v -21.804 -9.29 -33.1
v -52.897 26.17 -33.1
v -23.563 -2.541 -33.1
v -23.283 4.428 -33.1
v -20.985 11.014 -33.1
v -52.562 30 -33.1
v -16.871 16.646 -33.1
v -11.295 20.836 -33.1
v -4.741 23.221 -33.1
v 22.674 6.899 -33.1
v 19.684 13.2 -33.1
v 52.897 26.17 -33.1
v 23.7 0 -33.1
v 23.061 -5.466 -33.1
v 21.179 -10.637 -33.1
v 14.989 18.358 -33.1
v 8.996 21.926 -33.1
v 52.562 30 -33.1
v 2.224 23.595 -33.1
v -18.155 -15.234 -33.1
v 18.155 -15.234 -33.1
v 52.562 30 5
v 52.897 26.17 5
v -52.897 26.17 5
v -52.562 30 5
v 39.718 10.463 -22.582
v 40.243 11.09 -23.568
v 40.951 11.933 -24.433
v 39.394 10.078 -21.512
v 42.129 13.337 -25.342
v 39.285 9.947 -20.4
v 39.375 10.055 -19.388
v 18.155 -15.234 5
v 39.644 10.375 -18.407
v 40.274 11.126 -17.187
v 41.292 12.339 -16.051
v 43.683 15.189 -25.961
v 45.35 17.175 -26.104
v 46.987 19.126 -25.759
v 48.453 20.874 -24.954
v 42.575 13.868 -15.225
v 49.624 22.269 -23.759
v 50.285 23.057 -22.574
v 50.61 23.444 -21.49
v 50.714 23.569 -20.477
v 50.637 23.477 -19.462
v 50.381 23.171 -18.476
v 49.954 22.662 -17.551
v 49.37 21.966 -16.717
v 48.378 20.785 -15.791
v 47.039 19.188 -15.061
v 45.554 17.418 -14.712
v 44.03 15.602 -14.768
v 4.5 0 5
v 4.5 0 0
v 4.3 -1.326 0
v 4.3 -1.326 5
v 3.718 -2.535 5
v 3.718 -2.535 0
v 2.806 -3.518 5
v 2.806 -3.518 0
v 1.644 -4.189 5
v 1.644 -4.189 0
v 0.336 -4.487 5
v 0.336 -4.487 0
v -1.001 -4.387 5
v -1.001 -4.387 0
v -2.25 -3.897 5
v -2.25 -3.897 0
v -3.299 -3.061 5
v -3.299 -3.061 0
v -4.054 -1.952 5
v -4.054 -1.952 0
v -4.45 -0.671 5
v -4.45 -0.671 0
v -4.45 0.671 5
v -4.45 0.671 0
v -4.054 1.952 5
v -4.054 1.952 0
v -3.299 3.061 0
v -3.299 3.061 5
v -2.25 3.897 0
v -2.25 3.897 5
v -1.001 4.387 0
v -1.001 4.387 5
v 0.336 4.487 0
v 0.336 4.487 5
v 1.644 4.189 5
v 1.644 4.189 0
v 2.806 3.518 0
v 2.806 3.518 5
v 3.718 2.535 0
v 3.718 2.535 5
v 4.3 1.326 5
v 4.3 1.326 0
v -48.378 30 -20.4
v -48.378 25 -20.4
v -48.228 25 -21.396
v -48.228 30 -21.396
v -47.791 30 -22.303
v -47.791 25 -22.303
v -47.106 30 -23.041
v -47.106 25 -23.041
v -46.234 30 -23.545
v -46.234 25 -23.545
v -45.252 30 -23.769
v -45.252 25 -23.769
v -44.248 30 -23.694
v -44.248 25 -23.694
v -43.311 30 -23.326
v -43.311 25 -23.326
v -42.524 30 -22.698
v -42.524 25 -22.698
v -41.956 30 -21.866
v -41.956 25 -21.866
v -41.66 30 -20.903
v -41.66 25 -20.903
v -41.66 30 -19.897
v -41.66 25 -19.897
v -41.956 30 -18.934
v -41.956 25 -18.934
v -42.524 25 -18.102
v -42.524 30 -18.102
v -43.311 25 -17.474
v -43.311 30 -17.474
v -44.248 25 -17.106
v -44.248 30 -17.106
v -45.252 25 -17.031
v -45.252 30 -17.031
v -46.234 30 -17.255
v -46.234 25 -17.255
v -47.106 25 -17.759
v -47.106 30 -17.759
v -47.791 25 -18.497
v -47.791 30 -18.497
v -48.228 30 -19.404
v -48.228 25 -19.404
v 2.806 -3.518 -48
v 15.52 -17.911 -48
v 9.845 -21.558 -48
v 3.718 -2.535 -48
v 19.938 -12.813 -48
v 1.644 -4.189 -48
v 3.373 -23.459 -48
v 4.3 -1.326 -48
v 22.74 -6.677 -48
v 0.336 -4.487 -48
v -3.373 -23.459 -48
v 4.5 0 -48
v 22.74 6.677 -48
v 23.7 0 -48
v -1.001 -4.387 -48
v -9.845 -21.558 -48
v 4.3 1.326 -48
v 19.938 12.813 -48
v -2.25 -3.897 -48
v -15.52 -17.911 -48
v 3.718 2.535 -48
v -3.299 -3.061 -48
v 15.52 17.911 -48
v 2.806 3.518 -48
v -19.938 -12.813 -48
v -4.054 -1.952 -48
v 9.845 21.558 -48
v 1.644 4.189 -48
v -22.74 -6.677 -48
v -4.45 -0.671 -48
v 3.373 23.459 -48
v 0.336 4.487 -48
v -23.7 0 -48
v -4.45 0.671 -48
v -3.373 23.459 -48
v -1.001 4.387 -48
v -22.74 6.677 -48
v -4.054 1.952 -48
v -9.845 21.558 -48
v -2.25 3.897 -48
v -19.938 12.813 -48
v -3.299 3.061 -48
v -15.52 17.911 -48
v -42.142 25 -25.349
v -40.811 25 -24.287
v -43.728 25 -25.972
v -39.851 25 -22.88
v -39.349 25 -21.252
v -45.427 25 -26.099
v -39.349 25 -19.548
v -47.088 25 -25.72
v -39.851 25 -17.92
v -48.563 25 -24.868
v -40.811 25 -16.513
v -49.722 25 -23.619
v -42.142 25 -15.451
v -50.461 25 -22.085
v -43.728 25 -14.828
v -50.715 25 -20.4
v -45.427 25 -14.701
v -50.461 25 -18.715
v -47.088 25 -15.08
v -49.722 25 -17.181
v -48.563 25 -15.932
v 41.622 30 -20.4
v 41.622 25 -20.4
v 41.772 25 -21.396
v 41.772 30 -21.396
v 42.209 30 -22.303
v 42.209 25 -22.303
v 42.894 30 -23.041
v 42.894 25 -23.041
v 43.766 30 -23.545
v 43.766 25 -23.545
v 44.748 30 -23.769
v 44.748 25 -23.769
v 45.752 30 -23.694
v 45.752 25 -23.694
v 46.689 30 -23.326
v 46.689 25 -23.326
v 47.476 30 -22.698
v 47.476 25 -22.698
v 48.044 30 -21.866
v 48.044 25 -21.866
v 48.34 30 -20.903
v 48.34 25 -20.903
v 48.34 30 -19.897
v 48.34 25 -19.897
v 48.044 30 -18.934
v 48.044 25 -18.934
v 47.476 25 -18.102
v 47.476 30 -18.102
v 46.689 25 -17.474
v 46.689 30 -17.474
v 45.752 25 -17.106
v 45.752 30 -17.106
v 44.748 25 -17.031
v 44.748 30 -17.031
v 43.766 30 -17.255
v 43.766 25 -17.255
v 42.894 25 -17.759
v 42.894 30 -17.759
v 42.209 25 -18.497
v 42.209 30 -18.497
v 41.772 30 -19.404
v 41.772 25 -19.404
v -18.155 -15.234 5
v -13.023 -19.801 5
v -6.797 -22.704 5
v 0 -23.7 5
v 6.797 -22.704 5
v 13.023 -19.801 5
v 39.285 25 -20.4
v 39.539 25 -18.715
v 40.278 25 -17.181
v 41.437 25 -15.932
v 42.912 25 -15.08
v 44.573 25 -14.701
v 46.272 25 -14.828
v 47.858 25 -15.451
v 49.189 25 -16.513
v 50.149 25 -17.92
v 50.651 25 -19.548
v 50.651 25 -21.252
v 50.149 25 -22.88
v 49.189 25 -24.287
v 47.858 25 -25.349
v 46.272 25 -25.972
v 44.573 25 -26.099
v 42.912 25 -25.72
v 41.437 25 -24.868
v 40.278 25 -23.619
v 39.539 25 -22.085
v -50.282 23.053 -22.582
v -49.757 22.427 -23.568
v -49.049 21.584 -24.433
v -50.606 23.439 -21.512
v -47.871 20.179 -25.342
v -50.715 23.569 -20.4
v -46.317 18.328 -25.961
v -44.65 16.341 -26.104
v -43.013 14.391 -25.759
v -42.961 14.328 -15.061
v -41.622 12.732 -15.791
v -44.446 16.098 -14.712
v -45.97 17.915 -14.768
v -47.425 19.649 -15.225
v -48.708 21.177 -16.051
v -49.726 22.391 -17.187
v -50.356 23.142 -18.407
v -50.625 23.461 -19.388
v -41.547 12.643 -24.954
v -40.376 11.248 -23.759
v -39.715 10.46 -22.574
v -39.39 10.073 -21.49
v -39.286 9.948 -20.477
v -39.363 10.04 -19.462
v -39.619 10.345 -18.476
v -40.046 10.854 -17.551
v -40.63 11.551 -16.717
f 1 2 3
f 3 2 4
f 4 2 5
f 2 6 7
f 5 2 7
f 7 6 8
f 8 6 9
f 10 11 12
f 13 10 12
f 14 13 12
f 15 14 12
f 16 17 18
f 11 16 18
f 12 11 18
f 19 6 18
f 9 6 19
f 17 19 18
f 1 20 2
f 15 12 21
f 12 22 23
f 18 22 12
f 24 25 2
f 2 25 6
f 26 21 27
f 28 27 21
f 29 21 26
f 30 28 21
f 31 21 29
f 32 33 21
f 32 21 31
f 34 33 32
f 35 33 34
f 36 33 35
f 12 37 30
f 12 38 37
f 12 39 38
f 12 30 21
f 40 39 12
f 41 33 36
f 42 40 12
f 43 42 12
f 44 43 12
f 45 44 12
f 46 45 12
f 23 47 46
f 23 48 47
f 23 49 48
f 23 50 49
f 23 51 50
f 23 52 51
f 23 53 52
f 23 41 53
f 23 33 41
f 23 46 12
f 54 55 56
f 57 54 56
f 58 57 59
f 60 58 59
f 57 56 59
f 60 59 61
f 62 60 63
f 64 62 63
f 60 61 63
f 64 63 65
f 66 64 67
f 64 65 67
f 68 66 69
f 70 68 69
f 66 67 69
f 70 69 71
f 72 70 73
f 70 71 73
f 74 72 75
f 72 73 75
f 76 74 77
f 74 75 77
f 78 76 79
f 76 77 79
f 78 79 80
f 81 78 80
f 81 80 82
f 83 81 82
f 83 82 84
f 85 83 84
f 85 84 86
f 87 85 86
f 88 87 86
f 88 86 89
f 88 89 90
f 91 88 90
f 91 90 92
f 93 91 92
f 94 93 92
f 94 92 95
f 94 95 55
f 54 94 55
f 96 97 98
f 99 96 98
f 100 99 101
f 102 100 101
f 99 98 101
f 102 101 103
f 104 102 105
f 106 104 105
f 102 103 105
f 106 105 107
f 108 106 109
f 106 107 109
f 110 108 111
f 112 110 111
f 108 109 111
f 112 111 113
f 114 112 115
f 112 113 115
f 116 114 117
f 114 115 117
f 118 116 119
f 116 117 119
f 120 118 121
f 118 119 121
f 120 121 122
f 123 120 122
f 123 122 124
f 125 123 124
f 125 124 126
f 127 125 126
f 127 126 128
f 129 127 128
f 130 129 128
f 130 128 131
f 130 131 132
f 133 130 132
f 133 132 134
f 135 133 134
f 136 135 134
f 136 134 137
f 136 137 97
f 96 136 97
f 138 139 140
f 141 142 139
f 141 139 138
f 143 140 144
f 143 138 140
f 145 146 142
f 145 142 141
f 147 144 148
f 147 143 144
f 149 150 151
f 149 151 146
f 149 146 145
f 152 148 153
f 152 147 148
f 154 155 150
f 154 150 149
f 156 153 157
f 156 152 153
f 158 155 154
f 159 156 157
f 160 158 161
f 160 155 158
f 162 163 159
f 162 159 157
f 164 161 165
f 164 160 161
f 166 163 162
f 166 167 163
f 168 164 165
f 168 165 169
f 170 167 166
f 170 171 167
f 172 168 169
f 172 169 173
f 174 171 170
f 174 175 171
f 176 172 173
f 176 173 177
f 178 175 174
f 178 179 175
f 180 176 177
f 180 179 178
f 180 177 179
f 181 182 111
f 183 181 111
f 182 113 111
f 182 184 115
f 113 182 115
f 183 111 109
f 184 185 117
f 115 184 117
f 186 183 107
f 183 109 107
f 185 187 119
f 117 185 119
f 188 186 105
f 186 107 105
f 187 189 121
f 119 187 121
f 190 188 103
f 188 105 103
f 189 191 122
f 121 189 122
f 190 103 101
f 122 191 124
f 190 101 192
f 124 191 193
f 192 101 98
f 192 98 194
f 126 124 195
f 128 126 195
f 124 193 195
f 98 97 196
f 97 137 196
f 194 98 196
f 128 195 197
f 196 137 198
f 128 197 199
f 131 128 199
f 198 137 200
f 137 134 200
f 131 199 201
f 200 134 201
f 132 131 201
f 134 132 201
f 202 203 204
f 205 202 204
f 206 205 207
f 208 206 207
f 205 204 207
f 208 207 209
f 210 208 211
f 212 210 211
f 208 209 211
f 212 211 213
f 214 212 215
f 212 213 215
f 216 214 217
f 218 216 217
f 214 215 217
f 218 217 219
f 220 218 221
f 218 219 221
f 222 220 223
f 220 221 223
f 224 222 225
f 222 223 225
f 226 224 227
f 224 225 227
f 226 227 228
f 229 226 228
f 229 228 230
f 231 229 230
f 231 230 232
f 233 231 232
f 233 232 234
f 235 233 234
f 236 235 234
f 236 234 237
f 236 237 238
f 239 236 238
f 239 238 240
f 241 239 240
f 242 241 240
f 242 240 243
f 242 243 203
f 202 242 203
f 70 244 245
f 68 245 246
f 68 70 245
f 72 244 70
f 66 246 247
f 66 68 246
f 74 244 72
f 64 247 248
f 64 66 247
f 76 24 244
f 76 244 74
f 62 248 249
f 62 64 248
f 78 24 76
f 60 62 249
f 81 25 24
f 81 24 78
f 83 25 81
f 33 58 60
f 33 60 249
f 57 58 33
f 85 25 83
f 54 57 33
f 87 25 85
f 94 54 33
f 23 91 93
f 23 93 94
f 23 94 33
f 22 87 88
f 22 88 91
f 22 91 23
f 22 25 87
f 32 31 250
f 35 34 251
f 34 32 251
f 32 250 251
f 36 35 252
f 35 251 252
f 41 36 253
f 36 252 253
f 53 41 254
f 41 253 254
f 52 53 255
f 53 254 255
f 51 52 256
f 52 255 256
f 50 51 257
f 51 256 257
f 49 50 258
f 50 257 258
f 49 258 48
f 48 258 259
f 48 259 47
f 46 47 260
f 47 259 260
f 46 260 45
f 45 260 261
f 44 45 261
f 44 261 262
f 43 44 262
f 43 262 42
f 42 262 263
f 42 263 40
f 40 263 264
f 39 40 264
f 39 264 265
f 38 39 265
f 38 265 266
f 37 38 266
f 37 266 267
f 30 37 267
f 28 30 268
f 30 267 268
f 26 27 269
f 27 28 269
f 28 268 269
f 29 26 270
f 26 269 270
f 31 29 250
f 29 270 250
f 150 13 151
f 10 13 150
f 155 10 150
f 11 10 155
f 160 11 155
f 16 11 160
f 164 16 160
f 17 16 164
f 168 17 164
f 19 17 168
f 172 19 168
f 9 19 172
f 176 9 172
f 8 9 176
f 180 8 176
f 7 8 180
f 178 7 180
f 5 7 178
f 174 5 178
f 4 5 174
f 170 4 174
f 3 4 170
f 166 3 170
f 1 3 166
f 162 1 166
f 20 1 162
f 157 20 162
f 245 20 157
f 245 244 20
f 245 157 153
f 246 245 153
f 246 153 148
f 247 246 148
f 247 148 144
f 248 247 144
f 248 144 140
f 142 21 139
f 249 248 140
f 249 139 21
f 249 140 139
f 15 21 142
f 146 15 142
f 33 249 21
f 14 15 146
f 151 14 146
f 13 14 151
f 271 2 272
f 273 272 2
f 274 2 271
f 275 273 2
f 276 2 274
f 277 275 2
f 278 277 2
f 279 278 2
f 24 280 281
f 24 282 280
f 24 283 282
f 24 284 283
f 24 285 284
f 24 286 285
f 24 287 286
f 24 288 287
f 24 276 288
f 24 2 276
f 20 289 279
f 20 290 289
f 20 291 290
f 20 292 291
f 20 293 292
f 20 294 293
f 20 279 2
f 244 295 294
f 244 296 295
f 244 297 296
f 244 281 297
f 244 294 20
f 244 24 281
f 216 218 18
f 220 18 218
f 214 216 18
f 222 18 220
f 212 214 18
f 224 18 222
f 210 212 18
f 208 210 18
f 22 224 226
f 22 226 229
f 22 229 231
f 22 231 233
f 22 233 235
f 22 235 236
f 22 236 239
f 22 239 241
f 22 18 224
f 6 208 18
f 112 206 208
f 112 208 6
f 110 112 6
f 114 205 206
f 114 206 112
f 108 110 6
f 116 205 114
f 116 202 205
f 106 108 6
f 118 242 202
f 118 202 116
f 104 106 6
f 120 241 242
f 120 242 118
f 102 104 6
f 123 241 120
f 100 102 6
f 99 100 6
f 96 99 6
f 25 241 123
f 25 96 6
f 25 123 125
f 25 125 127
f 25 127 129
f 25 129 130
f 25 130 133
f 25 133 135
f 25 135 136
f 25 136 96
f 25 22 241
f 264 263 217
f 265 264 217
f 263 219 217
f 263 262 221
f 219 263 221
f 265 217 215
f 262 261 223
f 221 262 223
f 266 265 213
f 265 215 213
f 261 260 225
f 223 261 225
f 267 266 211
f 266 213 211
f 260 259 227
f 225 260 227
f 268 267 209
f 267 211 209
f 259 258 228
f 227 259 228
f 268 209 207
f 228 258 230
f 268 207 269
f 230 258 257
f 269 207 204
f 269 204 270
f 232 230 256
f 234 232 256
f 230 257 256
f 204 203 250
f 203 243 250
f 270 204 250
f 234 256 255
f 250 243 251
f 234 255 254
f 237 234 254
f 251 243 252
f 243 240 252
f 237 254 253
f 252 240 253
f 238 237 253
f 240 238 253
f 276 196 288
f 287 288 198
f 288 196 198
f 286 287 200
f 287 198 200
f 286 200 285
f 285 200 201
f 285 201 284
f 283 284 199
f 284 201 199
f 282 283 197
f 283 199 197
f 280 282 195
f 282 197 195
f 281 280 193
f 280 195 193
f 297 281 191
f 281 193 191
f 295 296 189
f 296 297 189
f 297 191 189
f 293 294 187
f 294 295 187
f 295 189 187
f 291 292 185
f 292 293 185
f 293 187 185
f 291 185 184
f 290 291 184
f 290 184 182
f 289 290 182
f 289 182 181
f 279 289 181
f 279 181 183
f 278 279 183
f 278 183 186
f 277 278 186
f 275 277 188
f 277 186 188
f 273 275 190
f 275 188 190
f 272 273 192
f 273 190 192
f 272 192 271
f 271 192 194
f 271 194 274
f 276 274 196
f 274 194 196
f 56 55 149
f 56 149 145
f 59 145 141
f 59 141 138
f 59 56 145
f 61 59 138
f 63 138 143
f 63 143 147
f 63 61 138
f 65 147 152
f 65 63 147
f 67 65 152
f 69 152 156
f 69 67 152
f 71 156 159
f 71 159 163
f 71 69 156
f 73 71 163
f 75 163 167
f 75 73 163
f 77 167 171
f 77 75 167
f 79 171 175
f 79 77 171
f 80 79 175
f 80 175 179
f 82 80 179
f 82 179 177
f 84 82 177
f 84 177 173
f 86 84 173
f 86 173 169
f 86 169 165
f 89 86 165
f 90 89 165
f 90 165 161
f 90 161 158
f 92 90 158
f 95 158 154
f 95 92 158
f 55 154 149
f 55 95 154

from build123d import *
from OCP.BRepFilletAPI import BRepFilletAPI_MakeChamfer

# Parameters (mm, degrees)
SKETCH1_R               = 23.7
SKETCH1_R_2             = 18.7
BOSS_EXTRUDE1_DEPTH     = 48
BOSS_EXTRUDE2_START     = 5
SKETCH1_3_R             = 23.7
SKETCH1_3_R_2           = 18.7
SKETCH1_3_R_3           = 15.5
SKETCH1_3_R_4           = 6.5
BOSS_EXTRUDE2_DEPTH     = 5
BOSS_EXTRUDE3_DEPTH     = 38.1
F_1_4_CLEARANCE_HOLE1_D = 6.7564
SKETCH9_R               = 5.715
CUT_EXTRUDE1_DEPTH      = 89.454226705
CHAMFER1_SIZE           = 5
CHAMFER1_SIZE2          = 3.549039071
SKETCH10_R              = 18.7
SKETCH10_R_2            = 4.5
BOSS_EXTRUDE4_DEPTH     = 48
SKETCH10_2_R            = 4.5
CUT_EXTRUDE2_DEPTH      = 78.473312523


with BuildPart() as part:
    # Sketch1 → Boss-Extrude1 (new body)
    with BuildSketch(Plane.XY):
        Circle(SKETCH1_R)
        Circle(SKETCH1_R_2, mode=Mode.SUBTRACT)
    extrude(amount=-BOSS_EXTRUDE1_DEPTH)

    # Sketch1<3> → Boss-Extrude2 (add)
    # profile 1 of 4: a face of its own
    with BuildSketch(Plane.XY.offset(BOSS_EXTRUDE2_START)):
        Circle(SKETCH1_3_R)
        Circle(SKETCH1_3_R_2, mode=Mode.SUBTRACT)
    # profile 2 of 4: a face of its own
    with BuildSketch(Plane.XY.offset(BOSS_EXTRUDE2_START)):
        Circle(SKETCH1_3_R_2)
        Circle(SKETCH1_3_R_3, mode=Mode.SUBTRACT)
    # profile 3 of 4: a face of its own
    with BuildSketch(Plane.XY.offset(BOSS_EXTRUDE2_START)):
        Circle(SKETCH1_3_R_3)
        with Locations((0, 7.5)):
            Circle(SKETCH1_3_R_4, mode=Mode.SUBTRACT)
    # profile 4 of 4: a face of its own
    with BuildSketch(Plane.XY.offset(BOSS_EXTRUDE2_START)):
        with Locations((0, 7.5)):
            Circle(SKETCH1_3_R_4)
    extrude(amount=-BOSS_EXTRUDE2_DEPTH)

    # Sketch5 → Boss-Extrude3 (add)
    with BuildSketch(Plane.XY.offset(5)):
        with BuildLine():
            Line((56.111141692, 30), (-56.111141692, 30))
            Line((-56.111141692, 30), (-18.155253302, -15.23406635))
            ThreePointArc((-18.155253302, -15.23406635), (-8.105877397, 22.270715113), (23.7, 0))
            ThreePointArc((23.7, 0), (22.270715113, -8.105877397), (18.155253302, -15.23406635))
            Line((18.155253302, -15.23406635), (56.111141692, 30))
        make_face()
    extrude(amount=-BOSS_EXTRUDE3_DEPTH)

    # 1/4 Clearance Hole1 (through all)
    with Locations(Plane(origin=(0, 30, 0), x_dir=(1, 0, 0), z_dir=(0, 1, 0))):
        with Locations((-45, 20.4), (45, 20.4)):
            Hole(F_1_4_CLEARANCE_HOLE1_D / 2)

    # Sketch9 → Cut-Extrude1 (cut, through all)
    with BuildSketch(Plane(origin=(0, 25, 0), x_dir=(1, 0, 0), z_dir=(0, 1, 0))):
        with Locations(Location((-45, 20.4, 0), (0, 0, 180))):
            Circle(SKETCH9_R)
        with Locations(Location((45, 20.4, 0), (0, 0, 180))):
            Circle(SKETCH9_R)
    extrude(amount=-CUT_EXTRUDE1_DEPTH, mode=Mode.SUBTRACT)

    # Chamfer1: one chamfer whose edges measure the first distance from different faces: ONE call of the kernel's chamfer builder (chamfer() names one face for all edges)
    chamfer1_edges_1 = [part.edges().sort_by_distance(p)[0] for p in [
        (56.111141692, 30, -14.05),
    ]]
    chamfer1_side_1 = [part.faces().sort_by_distance(p)[0] for p in [
        (36.532384477, 6.666945749, -13.565030067),
    ]]
    chamfer1_edges_2 = [part.edges().sort_by_distance(p)[0] for p in [
        (-56.111141692, 30, -14.05),
    ]]
    chamfer1_side_2 = [part.faces().sort_by_distance(p)[0] for p in [
        (-36.532384477, 6.666945749, -13.565030067),
    ]]
    chamfer1 = BRepFilletAPI_MakeChamfer(part.part.solid().wrapped)
    for e in chamfer1_edges_1:
        chamfer1.Add(CHAMFER1_SIZE, CHAMFER1_SIZE2, e.wrapped, chamfer1_side_1[0].wrapped)  # the first distance lies on this face
    for e in chamfer1_edges_2:
        chamfer1.Add(CHAMFER1_SIZE, CHAMFER1_SIZE2, e.wrapped, chamfer1_side_2[0].wrapped)  # the first distance lies on this face
    add(Compound.cast(chamfer1.Shape()), mode=Mode.REPLACE)

    # Sketch10 → Boss-Extrude4 (add)
    with BuildSketch(Plane(origin=(0, 0, 0), x_dir=(-1, 0, 0), z_dir=(0, 0, -1))):
        Circle(SKETCH10_R)
        with Locations(Location((0, 0, 0), (0, 0, 180))):
            Circle(SKETCH10_R_2, mode=Mode.SUBTRACT)
    extrude(amount=BOSS_EXTRUDE4_DEPTH)

    # Sketch10<2> → Cut-Extrude2 (cut, through all)
    with BuildSketch(Plane(origin=(0, 0, 0), x_dir=(-1, 0, 0), z_dir=(0, 0, -1))):
        with Locations(Location((0, 0, 0), (0, 0, 180))):
            Circle(SKETCH10_2_R)
    extrude(amount=-CUT_EXTRUDE2_DEPTH, mode=Mode.SUBTRACT)


solid = part.part
